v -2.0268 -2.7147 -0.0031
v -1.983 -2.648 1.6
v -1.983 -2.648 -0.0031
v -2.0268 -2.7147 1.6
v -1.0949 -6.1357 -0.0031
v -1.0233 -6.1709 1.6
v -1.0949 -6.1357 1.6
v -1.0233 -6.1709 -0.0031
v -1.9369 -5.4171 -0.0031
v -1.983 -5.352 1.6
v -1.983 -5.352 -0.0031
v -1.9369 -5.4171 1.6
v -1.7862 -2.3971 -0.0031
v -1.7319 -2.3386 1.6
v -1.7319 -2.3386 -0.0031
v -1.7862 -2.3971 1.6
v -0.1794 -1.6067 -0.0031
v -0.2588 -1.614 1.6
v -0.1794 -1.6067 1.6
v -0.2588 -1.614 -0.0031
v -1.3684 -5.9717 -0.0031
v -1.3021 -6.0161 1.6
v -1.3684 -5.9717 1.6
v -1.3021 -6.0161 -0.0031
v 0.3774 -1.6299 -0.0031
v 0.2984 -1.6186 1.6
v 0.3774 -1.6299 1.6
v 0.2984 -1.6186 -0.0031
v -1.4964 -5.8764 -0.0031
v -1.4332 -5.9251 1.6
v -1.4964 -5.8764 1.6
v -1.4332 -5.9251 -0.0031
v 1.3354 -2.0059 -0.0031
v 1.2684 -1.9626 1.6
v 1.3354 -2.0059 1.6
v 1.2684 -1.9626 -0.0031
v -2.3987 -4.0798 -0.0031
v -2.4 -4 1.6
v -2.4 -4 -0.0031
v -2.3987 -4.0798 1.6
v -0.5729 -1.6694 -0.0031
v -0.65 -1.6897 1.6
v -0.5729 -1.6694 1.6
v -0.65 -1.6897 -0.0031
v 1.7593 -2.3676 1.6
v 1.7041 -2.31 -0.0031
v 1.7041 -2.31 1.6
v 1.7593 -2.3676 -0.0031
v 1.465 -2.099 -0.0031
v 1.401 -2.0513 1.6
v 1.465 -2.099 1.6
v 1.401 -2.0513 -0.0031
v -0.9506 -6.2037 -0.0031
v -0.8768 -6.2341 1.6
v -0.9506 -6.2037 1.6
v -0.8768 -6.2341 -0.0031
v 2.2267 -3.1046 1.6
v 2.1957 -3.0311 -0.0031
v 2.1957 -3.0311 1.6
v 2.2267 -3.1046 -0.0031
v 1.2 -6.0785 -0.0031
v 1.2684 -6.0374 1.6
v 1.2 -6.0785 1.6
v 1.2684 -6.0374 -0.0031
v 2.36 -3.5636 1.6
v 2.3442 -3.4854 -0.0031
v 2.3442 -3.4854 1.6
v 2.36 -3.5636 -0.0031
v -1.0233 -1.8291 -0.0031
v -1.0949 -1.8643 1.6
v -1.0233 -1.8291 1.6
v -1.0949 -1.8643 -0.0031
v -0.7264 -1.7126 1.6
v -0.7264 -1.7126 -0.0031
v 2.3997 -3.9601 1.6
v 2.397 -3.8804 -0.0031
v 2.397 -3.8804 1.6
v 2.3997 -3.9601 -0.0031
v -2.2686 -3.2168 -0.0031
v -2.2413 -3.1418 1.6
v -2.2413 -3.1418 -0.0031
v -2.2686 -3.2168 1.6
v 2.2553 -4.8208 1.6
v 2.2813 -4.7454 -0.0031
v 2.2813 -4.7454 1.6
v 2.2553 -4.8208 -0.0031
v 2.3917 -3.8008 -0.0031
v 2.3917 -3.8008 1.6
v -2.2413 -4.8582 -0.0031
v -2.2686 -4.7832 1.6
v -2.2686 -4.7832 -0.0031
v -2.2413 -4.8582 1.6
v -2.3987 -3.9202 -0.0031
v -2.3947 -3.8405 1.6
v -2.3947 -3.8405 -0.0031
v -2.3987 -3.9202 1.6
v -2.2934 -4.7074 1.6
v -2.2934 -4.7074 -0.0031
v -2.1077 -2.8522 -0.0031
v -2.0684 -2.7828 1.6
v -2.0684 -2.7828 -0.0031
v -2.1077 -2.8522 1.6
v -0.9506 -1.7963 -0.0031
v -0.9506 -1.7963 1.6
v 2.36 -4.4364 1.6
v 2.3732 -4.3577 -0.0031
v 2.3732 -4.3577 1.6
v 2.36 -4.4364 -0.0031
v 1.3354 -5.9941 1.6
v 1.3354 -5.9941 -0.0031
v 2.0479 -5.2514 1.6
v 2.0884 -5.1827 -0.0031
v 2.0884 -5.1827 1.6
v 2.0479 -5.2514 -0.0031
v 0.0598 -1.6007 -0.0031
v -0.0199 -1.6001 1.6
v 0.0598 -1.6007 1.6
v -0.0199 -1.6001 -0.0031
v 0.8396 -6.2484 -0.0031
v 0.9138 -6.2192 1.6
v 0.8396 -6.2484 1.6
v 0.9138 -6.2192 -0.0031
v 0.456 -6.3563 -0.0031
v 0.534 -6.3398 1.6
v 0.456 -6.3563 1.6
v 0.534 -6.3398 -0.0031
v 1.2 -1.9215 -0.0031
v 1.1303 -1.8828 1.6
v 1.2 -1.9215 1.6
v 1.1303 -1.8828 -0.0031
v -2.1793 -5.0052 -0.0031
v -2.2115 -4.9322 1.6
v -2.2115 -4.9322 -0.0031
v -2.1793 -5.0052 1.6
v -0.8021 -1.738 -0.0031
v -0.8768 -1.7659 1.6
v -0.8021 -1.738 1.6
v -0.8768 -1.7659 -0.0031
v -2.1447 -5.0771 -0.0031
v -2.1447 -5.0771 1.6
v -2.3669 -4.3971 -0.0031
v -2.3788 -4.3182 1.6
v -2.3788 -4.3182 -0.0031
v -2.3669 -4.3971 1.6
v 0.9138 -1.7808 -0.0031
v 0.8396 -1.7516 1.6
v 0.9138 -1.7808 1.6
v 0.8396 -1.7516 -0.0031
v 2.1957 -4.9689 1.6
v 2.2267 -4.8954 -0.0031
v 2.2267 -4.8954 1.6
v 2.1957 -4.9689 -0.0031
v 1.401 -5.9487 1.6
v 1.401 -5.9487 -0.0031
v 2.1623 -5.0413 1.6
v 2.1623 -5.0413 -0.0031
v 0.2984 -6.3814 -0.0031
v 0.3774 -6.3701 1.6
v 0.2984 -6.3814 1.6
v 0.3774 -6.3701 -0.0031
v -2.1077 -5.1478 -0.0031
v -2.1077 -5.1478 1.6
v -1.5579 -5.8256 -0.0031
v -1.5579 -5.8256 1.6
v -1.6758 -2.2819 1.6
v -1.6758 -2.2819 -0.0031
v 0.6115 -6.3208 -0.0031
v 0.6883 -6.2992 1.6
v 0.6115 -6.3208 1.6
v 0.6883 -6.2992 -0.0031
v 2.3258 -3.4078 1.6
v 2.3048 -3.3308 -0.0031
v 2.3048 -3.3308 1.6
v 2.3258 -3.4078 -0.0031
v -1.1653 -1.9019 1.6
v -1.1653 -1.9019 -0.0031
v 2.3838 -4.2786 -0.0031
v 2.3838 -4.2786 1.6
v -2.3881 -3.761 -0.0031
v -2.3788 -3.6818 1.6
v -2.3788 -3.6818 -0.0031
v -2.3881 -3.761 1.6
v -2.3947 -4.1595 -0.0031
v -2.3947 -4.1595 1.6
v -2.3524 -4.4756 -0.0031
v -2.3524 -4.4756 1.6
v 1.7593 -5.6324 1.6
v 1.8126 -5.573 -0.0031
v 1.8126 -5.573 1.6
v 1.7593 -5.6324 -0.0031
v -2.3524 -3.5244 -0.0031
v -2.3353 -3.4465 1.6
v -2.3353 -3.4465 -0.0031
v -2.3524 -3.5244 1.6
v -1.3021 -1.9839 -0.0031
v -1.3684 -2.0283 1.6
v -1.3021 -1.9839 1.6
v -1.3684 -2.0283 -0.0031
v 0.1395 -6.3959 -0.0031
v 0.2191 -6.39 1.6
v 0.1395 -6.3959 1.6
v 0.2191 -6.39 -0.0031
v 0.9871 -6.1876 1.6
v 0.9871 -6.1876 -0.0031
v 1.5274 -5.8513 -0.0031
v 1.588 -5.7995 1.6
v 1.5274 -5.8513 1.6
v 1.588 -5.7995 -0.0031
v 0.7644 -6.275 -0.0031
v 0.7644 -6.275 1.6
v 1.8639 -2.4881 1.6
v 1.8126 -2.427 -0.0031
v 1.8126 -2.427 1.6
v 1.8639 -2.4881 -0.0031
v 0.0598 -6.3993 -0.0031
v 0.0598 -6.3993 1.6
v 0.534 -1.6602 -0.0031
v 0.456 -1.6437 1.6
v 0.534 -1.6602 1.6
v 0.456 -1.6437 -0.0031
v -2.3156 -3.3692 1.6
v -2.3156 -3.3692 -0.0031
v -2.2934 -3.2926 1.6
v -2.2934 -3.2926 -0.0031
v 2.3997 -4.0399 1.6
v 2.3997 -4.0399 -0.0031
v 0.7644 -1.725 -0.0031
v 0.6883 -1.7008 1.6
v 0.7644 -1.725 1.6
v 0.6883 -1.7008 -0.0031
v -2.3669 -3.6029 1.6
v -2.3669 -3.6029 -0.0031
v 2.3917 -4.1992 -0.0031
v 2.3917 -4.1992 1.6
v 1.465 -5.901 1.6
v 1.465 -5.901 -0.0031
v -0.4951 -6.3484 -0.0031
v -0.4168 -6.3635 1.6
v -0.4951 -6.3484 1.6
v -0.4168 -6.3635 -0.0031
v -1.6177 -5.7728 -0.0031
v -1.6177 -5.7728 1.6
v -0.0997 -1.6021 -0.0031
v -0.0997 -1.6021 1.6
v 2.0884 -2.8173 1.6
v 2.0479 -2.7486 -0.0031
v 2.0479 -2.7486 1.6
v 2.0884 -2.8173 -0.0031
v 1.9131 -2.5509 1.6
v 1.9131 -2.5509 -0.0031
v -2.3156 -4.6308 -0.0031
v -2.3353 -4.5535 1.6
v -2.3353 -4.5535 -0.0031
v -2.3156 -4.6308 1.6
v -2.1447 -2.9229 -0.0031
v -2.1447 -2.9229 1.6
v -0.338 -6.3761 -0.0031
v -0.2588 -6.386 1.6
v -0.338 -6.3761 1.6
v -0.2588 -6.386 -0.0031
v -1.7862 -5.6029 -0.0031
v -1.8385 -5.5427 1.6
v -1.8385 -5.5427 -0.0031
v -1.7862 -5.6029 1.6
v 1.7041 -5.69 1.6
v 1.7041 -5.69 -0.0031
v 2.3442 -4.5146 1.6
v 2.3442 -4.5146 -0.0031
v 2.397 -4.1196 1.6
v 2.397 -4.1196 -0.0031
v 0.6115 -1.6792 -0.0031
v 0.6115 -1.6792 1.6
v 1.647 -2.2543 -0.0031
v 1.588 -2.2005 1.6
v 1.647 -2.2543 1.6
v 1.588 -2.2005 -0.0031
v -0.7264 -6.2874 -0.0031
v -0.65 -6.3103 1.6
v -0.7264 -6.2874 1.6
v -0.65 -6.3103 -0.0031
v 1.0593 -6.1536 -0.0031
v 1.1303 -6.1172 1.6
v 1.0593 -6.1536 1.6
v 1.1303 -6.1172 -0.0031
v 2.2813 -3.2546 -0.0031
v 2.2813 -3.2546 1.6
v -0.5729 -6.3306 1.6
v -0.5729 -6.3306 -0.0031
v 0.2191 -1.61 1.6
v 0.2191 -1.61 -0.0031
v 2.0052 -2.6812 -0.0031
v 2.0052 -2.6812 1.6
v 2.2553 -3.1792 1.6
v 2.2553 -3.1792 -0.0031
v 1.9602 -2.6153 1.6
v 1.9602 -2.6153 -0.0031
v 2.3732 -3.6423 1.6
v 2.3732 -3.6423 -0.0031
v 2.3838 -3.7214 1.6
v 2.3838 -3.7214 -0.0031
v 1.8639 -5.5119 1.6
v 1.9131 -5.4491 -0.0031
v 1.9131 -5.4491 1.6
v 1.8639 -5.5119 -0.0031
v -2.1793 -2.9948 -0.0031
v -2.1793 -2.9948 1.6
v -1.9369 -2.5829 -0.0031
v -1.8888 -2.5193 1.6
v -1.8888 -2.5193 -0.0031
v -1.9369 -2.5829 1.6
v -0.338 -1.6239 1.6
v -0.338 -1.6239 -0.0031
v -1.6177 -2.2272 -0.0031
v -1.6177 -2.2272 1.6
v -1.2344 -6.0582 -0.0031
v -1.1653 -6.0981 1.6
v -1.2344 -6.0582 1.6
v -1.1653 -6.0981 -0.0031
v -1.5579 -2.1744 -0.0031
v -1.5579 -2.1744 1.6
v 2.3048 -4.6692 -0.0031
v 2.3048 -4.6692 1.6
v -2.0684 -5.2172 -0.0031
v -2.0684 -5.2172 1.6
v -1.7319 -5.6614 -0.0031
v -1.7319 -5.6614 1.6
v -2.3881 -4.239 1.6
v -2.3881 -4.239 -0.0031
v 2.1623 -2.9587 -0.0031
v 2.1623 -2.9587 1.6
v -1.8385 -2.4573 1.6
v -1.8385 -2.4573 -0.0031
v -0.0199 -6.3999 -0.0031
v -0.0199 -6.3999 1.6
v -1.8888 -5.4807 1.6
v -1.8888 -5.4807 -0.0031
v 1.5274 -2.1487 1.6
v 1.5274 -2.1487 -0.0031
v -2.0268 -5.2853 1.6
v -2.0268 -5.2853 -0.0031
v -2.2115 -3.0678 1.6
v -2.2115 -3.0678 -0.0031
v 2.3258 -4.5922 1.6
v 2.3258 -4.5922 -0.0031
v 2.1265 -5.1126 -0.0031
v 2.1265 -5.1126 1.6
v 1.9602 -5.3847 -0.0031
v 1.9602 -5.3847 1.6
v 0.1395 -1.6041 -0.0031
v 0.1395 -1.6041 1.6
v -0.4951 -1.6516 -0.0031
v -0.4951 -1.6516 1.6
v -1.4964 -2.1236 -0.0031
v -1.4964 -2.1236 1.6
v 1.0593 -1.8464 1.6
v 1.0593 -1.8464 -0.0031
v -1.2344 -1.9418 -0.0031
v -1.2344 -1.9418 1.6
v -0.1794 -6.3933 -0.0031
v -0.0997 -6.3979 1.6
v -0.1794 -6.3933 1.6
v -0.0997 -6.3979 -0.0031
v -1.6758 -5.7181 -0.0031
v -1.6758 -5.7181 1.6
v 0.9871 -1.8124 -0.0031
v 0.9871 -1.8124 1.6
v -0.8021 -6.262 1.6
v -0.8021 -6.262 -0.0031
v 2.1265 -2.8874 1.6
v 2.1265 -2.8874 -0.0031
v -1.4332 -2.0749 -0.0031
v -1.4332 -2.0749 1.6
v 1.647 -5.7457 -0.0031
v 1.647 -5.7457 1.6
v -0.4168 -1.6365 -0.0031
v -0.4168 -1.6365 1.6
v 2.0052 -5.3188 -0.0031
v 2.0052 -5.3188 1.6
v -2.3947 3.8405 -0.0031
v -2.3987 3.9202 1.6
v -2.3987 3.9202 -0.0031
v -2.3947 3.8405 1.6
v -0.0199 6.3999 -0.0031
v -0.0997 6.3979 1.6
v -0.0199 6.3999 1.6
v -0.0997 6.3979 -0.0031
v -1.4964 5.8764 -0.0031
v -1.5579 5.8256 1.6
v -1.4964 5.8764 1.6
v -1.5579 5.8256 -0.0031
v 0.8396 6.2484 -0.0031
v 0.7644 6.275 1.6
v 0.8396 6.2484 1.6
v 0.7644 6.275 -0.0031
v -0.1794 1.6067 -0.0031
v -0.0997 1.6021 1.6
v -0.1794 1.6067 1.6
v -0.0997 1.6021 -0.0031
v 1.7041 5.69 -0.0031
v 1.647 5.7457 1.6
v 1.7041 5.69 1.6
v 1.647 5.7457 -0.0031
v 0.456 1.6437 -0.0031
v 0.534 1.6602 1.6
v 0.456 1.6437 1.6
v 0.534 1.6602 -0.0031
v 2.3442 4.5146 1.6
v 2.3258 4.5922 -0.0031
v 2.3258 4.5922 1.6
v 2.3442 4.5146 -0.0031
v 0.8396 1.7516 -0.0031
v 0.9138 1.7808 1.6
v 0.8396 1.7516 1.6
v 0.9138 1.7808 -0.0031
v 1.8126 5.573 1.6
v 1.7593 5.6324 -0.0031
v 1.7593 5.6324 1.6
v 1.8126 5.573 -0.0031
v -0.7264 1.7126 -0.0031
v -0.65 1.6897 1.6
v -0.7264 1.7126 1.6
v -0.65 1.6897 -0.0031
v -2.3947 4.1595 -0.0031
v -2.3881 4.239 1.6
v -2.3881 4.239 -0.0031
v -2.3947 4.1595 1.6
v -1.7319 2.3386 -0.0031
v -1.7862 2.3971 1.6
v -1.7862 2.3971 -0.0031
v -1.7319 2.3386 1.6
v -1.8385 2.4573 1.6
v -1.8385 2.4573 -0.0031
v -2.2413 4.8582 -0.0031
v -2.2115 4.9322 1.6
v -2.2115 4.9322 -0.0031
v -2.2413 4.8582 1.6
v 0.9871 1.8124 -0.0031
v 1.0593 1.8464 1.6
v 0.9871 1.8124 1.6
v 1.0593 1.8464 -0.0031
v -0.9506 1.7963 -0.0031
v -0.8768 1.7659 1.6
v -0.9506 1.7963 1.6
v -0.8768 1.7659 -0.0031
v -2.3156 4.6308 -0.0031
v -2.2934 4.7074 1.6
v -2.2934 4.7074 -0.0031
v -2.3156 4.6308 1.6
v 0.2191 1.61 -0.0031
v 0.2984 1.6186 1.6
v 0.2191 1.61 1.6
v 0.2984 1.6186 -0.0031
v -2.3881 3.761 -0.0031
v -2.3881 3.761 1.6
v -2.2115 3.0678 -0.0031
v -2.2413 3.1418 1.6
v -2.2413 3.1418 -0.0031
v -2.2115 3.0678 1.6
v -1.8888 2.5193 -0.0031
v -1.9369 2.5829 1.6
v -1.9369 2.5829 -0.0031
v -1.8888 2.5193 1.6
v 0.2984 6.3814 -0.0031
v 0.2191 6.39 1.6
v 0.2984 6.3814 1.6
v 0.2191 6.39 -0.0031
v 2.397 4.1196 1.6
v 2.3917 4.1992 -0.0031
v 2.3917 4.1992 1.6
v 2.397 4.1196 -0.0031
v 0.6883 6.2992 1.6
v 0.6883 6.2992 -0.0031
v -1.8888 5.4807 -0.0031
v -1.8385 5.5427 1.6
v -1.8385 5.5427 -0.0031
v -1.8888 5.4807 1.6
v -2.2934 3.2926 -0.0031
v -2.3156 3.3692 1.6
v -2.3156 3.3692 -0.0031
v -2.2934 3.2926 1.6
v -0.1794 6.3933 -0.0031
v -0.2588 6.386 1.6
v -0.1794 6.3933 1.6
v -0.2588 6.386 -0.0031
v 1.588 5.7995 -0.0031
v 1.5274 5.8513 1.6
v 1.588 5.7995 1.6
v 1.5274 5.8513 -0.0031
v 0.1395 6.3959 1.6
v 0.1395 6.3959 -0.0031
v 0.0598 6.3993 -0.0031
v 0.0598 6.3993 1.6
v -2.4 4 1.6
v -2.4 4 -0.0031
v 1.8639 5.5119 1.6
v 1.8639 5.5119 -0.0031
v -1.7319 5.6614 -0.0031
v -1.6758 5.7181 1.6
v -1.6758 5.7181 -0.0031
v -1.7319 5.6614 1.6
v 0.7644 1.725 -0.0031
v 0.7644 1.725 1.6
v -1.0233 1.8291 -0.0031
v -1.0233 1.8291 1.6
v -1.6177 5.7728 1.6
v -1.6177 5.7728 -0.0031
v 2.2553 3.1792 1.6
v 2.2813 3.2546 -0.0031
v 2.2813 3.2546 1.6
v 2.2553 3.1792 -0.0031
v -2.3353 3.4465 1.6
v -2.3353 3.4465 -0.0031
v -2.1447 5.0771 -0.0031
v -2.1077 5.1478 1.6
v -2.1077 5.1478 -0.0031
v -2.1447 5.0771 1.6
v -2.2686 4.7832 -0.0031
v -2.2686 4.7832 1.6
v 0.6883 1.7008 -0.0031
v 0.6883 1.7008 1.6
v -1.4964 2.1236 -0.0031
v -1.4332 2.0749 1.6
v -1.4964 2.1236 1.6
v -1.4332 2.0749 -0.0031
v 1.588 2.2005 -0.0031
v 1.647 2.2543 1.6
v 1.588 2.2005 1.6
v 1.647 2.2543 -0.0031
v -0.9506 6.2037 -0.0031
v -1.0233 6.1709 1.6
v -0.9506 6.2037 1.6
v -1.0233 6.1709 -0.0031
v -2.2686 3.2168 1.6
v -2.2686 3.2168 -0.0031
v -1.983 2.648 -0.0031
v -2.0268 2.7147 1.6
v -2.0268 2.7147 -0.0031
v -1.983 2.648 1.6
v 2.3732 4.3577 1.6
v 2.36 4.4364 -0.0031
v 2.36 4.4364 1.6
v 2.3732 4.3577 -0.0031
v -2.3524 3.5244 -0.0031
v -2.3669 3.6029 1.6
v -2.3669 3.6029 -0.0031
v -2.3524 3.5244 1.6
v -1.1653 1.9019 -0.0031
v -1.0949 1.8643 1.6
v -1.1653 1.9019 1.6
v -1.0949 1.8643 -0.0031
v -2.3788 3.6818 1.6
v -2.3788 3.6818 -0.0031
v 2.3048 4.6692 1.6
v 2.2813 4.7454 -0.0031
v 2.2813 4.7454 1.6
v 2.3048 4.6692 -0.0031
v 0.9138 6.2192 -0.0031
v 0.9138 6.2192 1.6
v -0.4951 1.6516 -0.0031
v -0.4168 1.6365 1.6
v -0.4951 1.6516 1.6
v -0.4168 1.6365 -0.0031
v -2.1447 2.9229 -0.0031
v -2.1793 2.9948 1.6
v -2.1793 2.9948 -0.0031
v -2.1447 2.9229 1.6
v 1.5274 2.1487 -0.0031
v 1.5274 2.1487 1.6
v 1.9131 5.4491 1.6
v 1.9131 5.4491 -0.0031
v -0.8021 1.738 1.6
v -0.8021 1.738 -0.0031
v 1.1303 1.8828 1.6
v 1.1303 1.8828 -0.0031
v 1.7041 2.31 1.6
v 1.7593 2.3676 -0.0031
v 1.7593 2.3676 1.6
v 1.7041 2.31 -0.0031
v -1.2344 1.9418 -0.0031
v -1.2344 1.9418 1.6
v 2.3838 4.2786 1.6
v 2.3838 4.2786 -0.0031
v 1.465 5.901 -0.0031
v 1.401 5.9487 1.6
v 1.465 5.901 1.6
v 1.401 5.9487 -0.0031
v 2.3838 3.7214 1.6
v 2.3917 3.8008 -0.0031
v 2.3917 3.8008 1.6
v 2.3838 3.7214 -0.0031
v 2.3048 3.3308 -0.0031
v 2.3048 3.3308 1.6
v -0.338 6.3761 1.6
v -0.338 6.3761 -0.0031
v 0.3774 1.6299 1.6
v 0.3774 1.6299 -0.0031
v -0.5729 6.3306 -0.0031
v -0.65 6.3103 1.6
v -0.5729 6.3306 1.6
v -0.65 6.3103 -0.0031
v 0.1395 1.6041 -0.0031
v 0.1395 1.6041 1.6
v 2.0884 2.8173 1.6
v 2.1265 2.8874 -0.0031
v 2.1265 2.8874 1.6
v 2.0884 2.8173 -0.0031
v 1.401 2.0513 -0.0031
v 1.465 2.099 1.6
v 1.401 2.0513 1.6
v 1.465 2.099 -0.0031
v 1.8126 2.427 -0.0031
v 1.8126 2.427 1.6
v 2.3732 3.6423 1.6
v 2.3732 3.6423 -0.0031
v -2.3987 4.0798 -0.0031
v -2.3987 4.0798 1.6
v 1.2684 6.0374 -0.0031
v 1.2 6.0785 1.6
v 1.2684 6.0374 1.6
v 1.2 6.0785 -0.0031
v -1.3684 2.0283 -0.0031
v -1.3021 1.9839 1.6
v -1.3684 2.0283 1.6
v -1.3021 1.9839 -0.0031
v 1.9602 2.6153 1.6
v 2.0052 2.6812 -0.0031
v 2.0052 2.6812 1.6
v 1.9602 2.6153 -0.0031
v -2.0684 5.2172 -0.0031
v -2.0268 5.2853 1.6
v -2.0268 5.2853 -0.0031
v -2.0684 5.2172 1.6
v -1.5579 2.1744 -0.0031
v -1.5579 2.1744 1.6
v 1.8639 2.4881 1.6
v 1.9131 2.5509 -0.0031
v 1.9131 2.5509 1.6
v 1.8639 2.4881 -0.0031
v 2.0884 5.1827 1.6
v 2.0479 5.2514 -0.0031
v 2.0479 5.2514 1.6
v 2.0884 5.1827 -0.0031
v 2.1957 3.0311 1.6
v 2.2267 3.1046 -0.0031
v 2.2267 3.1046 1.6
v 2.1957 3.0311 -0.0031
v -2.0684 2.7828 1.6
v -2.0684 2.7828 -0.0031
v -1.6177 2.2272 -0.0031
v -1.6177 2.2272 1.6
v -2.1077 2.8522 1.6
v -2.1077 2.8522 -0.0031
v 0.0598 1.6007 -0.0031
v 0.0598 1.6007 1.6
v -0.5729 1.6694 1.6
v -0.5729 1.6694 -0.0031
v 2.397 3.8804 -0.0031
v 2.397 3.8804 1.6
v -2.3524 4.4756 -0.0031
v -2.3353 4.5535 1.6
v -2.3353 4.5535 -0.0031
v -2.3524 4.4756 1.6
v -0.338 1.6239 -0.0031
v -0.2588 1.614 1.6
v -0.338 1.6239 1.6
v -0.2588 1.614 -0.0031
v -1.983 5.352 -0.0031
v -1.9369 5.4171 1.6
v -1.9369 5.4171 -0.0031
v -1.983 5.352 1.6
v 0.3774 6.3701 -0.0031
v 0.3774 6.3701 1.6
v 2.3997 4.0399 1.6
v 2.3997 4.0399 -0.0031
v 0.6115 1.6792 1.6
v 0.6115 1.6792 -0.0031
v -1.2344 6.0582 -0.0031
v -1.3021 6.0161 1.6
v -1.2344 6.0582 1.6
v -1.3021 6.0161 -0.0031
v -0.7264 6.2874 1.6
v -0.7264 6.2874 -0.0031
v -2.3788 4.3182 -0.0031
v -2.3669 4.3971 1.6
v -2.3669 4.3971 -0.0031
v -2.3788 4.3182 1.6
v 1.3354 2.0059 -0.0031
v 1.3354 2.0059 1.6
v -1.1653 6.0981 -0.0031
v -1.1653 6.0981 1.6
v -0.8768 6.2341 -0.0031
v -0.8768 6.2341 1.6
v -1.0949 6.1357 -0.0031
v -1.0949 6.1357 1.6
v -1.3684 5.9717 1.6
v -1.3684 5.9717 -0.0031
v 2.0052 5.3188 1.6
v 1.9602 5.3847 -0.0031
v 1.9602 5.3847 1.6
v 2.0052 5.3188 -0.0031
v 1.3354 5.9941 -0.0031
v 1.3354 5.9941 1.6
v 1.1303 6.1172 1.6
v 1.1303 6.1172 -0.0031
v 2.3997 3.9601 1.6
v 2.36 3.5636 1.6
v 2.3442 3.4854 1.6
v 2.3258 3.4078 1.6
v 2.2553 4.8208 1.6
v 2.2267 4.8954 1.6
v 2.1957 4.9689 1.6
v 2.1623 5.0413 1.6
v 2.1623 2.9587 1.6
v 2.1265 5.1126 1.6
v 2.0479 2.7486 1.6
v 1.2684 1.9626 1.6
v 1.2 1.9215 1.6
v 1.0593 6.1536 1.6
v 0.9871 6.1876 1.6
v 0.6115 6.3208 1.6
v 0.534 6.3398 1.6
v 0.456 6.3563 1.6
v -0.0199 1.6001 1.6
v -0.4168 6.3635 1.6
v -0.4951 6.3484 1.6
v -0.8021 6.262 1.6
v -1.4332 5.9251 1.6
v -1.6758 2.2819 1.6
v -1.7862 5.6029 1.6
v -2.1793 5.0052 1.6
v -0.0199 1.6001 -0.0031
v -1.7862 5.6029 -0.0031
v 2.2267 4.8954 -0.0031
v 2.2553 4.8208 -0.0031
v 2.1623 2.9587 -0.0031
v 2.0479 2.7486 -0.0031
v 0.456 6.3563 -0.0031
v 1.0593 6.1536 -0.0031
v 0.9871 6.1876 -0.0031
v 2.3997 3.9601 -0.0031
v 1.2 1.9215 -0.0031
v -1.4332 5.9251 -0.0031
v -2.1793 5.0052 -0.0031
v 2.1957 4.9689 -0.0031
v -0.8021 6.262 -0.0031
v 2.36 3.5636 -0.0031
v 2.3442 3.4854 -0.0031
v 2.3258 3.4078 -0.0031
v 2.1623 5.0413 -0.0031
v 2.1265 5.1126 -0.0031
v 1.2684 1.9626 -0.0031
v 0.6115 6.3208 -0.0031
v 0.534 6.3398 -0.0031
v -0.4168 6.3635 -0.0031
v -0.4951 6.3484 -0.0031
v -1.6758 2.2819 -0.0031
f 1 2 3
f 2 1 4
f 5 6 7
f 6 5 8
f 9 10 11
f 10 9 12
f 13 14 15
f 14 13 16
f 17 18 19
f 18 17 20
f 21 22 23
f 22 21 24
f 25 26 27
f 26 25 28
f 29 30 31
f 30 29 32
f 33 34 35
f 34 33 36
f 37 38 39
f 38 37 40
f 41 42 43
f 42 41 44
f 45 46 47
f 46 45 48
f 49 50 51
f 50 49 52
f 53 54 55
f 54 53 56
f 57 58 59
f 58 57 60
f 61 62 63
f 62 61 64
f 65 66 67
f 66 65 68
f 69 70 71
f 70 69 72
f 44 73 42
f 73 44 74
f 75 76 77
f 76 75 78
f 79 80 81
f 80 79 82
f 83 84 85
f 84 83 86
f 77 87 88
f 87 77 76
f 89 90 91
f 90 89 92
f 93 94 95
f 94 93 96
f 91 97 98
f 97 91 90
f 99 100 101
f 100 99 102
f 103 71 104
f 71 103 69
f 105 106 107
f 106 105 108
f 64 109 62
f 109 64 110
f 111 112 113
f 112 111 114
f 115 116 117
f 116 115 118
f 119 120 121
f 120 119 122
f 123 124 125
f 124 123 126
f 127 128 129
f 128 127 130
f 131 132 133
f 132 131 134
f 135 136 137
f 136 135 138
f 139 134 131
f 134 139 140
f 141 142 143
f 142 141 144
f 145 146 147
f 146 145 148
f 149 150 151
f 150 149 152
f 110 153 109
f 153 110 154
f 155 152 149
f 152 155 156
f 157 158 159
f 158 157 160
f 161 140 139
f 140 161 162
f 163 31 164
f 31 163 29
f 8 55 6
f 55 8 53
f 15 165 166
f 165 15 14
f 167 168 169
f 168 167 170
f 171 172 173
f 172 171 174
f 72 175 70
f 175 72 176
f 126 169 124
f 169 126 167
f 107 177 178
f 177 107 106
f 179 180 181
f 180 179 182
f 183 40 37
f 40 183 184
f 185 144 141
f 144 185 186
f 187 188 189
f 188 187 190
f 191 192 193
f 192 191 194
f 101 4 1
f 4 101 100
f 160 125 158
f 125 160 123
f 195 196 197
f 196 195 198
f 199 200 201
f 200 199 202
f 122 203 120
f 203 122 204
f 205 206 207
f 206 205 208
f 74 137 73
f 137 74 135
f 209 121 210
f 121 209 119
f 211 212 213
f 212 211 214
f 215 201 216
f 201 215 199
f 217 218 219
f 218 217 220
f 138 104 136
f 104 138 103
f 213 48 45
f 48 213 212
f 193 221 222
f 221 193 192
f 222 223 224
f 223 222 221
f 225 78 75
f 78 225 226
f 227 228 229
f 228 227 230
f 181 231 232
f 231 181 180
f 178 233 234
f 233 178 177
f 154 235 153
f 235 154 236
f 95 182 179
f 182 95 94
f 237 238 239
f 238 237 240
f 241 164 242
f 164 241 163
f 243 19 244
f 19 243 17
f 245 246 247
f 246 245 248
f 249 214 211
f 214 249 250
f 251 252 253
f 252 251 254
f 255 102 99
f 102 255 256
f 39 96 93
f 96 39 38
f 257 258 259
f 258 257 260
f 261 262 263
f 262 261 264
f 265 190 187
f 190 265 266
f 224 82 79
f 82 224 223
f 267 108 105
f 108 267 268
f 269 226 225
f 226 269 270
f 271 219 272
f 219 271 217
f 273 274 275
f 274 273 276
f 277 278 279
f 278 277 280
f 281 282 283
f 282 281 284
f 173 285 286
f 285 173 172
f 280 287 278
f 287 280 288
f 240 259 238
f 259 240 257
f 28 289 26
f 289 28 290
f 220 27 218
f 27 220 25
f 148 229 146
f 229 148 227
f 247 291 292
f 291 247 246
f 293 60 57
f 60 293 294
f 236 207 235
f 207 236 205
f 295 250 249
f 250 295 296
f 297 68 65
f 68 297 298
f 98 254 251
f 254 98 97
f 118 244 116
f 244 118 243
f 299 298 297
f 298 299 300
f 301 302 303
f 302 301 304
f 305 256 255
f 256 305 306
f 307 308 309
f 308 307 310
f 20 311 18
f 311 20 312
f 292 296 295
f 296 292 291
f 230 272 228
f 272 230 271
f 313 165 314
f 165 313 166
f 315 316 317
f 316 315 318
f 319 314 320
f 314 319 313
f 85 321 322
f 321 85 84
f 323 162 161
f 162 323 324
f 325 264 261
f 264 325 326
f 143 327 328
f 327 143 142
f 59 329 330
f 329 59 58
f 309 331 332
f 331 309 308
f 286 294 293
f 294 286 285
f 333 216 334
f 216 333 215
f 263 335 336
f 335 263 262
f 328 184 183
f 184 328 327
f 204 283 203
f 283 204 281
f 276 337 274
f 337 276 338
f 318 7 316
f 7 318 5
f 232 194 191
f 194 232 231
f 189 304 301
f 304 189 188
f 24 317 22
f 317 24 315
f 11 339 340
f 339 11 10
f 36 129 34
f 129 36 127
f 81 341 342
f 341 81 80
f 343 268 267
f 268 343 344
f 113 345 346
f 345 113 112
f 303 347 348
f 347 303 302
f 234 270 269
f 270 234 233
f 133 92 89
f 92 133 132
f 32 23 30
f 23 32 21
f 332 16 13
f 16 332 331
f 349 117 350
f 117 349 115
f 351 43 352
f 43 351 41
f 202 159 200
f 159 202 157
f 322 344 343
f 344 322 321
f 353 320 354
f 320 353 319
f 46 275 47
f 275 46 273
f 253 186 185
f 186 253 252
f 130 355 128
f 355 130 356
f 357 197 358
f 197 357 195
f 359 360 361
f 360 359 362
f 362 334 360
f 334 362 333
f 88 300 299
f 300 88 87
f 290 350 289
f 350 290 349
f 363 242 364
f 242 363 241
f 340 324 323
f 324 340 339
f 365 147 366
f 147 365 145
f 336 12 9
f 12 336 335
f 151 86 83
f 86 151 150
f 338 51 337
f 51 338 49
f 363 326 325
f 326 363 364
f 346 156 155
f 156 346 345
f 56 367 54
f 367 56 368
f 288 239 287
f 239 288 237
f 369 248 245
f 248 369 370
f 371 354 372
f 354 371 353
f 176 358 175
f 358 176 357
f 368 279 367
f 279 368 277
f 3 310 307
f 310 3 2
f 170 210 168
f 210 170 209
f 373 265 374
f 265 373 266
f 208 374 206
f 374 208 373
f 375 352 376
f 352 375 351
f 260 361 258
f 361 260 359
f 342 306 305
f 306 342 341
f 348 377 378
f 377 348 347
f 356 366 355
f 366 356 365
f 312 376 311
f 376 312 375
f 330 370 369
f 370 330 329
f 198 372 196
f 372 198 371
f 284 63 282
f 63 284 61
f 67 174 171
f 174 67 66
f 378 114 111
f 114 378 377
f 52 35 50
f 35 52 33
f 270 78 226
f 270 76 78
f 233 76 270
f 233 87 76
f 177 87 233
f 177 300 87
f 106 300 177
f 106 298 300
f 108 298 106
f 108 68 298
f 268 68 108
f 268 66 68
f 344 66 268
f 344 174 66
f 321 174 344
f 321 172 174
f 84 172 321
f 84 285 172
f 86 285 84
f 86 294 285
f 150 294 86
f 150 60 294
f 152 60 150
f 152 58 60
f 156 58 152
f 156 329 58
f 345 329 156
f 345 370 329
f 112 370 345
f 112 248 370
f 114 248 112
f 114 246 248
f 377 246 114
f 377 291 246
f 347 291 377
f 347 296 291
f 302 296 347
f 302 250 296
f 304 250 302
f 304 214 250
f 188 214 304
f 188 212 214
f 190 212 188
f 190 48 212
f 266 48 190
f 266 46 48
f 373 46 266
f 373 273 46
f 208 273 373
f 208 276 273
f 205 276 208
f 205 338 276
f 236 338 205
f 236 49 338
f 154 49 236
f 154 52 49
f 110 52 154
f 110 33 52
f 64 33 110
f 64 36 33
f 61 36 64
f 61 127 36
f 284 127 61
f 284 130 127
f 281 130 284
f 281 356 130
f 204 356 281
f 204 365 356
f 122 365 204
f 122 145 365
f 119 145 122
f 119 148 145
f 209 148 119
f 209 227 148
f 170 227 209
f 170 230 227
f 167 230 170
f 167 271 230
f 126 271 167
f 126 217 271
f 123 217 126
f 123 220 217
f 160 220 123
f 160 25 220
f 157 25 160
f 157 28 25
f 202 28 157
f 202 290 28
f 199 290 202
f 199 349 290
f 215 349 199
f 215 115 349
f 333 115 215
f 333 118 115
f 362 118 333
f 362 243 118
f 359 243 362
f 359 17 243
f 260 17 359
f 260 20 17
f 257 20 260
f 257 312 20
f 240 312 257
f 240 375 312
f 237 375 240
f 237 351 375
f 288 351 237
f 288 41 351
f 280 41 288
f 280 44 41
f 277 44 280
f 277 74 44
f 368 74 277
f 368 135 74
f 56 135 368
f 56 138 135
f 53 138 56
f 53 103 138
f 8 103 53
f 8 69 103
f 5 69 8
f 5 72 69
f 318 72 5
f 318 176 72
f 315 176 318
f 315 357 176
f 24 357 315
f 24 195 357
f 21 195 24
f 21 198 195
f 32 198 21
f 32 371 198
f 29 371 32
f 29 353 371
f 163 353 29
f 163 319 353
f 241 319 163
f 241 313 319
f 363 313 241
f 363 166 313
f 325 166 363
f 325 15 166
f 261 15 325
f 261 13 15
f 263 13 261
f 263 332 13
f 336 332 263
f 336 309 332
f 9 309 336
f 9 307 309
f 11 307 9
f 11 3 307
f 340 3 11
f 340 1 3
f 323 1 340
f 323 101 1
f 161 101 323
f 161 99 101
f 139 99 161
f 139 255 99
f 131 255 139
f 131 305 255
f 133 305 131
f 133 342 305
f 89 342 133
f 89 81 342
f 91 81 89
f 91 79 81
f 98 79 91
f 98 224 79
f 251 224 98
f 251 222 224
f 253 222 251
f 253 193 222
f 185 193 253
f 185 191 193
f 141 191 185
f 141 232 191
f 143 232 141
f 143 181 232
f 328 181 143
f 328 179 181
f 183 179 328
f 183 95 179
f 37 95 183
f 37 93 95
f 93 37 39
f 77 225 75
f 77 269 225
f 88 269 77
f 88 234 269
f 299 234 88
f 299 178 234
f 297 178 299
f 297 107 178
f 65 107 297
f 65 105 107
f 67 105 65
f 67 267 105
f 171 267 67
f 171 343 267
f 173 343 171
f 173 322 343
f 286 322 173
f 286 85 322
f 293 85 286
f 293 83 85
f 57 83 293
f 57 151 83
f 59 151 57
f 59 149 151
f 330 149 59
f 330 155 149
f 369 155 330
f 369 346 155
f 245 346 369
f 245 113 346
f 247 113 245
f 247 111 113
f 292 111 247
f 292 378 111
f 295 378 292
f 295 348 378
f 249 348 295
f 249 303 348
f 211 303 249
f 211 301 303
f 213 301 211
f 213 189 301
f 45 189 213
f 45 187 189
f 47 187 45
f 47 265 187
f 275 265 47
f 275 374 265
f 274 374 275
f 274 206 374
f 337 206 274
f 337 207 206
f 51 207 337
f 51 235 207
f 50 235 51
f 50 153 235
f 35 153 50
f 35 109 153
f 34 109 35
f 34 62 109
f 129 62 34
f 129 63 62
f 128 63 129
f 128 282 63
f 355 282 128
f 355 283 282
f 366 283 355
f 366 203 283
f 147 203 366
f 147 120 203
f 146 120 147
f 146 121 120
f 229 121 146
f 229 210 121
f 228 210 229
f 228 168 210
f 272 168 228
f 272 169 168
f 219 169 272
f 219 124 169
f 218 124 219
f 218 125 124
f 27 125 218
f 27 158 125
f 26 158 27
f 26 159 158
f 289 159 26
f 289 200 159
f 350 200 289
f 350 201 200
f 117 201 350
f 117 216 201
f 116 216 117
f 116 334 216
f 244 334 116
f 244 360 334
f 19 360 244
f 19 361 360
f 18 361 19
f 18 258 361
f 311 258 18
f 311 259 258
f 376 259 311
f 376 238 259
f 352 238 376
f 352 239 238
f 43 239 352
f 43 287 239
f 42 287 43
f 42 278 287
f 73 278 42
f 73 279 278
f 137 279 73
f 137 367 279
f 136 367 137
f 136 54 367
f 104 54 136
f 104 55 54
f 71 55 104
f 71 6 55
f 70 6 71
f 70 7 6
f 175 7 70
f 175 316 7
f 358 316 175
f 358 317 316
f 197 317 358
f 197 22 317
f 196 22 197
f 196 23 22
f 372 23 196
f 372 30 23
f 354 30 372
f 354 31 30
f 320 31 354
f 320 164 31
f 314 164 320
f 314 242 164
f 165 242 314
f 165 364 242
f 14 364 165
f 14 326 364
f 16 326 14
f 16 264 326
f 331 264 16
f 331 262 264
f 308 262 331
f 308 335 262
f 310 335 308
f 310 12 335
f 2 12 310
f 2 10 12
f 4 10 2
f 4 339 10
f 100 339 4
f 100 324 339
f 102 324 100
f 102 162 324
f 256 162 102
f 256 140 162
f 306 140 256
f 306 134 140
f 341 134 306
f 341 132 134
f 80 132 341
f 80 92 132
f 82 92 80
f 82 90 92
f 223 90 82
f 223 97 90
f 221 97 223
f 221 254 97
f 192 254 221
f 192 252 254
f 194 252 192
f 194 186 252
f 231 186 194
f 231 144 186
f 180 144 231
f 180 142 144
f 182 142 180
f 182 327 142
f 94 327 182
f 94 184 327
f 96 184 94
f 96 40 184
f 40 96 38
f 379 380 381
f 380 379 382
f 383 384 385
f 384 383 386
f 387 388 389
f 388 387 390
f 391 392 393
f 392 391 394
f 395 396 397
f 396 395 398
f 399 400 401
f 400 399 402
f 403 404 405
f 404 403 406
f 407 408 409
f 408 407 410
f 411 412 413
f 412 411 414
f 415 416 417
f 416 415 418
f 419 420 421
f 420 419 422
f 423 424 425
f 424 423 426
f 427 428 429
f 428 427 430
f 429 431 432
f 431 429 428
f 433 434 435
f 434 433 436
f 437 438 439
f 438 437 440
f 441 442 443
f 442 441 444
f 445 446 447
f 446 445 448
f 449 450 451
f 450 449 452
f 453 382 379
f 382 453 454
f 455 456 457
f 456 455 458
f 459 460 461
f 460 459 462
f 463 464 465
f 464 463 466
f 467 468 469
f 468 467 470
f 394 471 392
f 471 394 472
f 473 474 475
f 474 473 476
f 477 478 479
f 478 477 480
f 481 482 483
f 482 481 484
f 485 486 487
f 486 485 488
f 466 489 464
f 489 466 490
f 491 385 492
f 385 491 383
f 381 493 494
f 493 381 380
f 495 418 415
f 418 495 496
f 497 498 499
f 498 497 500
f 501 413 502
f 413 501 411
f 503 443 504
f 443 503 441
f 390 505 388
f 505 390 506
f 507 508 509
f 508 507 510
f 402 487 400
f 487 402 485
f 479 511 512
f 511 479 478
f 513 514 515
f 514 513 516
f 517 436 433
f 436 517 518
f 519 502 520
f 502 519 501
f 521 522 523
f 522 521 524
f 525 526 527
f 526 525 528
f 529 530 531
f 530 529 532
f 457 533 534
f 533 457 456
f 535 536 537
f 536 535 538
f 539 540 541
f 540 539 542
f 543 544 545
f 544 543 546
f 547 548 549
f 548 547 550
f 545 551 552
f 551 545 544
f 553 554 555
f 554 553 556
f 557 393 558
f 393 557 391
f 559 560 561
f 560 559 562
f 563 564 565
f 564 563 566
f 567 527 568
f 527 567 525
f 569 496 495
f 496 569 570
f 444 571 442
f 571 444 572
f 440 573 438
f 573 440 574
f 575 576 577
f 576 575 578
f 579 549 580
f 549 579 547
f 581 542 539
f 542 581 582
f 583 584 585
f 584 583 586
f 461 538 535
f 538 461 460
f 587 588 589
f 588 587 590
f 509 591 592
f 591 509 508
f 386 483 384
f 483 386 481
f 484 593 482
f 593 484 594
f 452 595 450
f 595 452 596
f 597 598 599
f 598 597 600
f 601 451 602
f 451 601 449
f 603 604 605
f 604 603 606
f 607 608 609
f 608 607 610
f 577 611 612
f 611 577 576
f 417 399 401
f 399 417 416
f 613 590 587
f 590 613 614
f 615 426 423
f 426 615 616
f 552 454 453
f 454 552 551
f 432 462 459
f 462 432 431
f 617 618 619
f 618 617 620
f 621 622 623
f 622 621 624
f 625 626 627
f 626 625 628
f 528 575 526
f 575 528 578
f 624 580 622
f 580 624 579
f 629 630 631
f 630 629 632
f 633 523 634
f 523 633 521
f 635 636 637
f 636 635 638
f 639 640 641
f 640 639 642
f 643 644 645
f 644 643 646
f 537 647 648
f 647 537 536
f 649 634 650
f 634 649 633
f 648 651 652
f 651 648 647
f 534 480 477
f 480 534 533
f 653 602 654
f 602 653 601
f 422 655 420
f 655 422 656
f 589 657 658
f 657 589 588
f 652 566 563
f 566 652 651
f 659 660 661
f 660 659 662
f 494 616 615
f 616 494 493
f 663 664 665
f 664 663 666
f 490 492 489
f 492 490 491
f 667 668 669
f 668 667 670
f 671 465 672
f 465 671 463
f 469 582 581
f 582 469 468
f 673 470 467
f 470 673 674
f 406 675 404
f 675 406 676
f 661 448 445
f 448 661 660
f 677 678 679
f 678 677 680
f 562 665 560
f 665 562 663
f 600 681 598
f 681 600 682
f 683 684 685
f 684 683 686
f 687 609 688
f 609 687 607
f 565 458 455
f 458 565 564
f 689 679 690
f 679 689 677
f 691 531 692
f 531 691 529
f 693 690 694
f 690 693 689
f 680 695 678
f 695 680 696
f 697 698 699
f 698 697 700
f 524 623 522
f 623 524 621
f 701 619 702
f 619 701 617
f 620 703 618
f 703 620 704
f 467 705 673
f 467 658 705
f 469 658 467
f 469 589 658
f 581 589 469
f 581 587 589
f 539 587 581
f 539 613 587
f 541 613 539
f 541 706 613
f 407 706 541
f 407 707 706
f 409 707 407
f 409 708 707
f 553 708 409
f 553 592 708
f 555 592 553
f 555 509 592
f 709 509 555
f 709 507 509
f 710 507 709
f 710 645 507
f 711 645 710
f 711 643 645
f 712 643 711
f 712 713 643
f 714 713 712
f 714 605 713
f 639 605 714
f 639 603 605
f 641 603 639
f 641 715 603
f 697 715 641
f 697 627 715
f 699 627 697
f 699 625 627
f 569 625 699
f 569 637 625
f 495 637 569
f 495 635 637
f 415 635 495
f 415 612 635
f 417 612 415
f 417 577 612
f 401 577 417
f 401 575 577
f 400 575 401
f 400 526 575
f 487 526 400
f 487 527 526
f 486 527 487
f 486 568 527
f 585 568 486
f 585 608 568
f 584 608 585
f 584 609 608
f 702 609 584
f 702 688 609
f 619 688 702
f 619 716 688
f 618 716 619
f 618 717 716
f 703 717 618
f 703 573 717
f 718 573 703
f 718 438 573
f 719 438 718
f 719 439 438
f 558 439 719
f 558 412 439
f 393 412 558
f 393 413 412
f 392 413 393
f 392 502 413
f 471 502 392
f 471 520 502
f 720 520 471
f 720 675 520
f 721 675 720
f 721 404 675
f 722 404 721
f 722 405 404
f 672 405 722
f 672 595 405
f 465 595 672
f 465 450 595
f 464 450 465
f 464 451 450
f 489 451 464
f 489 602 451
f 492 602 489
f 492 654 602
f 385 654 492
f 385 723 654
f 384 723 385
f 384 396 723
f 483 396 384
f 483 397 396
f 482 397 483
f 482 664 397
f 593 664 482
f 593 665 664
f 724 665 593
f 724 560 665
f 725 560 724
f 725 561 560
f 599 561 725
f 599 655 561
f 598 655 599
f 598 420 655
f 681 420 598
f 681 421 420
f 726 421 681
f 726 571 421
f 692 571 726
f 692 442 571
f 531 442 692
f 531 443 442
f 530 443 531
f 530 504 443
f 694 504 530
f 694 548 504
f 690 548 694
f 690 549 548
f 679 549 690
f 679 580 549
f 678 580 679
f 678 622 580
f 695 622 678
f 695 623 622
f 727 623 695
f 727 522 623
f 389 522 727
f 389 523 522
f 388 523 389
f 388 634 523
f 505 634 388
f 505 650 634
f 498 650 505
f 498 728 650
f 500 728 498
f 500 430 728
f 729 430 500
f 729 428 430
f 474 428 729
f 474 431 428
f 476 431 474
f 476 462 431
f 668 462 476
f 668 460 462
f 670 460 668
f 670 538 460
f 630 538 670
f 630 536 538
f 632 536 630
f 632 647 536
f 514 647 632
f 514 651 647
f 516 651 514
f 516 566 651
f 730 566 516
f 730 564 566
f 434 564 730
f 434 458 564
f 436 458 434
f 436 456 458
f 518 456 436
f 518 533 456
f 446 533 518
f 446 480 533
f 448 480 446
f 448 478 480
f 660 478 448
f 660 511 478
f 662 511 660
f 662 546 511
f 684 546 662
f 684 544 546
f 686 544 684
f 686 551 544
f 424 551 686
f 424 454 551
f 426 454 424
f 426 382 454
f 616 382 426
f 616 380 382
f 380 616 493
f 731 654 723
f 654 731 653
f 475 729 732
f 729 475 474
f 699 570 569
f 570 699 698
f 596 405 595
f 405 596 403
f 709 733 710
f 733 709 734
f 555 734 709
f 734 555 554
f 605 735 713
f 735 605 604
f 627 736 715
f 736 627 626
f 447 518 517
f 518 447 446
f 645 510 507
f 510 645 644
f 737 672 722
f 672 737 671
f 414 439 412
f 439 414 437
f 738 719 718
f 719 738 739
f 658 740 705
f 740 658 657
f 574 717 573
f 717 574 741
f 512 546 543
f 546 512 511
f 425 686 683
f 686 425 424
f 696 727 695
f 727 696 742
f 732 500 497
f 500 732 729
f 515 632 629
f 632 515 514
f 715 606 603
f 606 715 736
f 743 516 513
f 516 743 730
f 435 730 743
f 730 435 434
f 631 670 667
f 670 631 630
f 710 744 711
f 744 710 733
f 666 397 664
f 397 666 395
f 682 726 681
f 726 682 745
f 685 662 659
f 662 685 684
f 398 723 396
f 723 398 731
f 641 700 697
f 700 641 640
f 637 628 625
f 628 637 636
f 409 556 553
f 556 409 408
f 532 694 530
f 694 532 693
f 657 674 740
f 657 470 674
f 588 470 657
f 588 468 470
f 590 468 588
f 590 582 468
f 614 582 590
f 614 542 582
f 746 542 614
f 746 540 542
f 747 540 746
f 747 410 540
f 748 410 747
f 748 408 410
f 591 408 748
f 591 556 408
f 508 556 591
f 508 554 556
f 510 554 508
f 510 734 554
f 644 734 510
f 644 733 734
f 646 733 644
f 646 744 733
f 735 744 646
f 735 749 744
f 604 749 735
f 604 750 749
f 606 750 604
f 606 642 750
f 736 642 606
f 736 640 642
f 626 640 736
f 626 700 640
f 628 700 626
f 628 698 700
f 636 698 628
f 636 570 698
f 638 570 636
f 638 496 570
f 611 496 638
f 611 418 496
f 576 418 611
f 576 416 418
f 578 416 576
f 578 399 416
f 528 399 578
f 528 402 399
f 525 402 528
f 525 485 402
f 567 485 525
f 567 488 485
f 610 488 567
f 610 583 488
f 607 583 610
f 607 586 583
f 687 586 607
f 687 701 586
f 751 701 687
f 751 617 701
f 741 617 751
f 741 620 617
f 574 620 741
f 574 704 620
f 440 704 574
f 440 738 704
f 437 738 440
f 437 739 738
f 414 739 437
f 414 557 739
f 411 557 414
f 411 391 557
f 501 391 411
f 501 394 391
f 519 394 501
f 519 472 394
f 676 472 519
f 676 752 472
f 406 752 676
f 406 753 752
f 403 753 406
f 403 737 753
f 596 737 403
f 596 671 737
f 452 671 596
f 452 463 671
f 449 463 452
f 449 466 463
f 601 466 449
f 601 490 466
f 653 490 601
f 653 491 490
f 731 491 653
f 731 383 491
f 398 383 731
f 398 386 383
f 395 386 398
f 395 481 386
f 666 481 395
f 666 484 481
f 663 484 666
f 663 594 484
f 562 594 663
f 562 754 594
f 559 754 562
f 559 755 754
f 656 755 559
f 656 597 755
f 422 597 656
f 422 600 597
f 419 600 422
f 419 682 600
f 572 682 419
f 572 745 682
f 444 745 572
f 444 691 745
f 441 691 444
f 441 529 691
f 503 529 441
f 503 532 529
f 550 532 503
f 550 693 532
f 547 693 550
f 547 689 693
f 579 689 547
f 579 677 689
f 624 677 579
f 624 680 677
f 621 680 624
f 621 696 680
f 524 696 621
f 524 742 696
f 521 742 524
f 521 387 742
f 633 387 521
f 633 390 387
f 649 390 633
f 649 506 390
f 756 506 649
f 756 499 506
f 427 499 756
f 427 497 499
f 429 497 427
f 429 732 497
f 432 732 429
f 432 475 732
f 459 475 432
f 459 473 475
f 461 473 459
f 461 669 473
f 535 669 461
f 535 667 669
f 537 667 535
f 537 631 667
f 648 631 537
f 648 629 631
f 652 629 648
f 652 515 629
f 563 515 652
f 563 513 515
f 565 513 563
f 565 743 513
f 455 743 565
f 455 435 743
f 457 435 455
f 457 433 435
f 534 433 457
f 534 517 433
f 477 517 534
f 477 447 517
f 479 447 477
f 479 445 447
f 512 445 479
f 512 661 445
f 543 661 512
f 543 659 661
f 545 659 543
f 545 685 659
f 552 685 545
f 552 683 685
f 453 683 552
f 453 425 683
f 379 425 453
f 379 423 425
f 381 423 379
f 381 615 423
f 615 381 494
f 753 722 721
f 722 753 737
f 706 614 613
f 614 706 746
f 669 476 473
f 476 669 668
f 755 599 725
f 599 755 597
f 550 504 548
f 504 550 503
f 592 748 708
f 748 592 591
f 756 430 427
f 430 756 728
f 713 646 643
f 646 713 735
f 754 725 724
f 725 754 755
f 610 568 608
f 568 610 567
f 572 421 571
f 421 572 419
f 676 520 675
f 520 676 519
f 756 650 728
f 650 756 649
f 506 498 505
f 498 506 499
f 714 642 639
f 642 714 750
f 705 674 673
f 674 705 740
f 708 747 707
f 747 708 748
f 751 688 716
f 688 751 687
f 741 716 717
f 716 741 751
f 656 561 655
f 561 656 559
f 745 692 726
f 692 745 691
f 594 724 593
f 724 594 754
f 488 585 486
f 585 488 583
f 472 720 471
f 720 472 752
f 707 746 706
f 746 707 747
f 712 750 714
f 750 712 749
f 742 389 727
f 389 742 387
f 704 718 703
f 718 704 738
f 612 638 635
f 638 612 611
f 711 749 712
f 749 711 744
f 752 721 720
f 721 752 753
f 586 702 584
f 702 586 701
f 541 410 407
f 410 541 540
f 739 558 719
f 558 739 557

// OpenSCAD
use <../../lib.scad>
use <42022s01.scad>
$fa=1; $fs=0.2;
function ldraw_lib__s__464s01(realsolid=false) = [
// 0 ~Moved to s\42022s01
// 0 Name: s\464s01.dat
// 0 Author: [PTadmin]
// 0 !LDRAW_ORG Subpart UPDATE 2022-04
// 0 !LICENSE Licensed under CC BY 4.0 : see CAreadme.txt
// 
// 0 BFC CERTIFY CCW
  [0,"BFC","CERTIFY"],
  [0,"BFC","CCW"],
// 
// 0 !HISTORY 2022-07-18 [PTadmin] Official Update 2022-04
// 
// 
// 0 // ~Slope Brick Curved 6 x 1 without Top Surface
// 1 16 0 0 0 1 0 0 0 1 0 0 0 1 s\42022s01.dat
  [1,16,0,0,0,1,0,0,0,1,0,0,0,1, ldraw_lib__s__42022s01(realsolid)],
];
module ldraw_lib__s__464s01(step=0, col=false, unit=2/5, alt=false, line=0.2, solid=!$preview)
    makepoly(ldraw_lib__s__464s01(solid), step=step, col=col, unit=unit, alt=alt, line=line, solid=solid);
ldraw_lib__s__464s01(line=0.2);
